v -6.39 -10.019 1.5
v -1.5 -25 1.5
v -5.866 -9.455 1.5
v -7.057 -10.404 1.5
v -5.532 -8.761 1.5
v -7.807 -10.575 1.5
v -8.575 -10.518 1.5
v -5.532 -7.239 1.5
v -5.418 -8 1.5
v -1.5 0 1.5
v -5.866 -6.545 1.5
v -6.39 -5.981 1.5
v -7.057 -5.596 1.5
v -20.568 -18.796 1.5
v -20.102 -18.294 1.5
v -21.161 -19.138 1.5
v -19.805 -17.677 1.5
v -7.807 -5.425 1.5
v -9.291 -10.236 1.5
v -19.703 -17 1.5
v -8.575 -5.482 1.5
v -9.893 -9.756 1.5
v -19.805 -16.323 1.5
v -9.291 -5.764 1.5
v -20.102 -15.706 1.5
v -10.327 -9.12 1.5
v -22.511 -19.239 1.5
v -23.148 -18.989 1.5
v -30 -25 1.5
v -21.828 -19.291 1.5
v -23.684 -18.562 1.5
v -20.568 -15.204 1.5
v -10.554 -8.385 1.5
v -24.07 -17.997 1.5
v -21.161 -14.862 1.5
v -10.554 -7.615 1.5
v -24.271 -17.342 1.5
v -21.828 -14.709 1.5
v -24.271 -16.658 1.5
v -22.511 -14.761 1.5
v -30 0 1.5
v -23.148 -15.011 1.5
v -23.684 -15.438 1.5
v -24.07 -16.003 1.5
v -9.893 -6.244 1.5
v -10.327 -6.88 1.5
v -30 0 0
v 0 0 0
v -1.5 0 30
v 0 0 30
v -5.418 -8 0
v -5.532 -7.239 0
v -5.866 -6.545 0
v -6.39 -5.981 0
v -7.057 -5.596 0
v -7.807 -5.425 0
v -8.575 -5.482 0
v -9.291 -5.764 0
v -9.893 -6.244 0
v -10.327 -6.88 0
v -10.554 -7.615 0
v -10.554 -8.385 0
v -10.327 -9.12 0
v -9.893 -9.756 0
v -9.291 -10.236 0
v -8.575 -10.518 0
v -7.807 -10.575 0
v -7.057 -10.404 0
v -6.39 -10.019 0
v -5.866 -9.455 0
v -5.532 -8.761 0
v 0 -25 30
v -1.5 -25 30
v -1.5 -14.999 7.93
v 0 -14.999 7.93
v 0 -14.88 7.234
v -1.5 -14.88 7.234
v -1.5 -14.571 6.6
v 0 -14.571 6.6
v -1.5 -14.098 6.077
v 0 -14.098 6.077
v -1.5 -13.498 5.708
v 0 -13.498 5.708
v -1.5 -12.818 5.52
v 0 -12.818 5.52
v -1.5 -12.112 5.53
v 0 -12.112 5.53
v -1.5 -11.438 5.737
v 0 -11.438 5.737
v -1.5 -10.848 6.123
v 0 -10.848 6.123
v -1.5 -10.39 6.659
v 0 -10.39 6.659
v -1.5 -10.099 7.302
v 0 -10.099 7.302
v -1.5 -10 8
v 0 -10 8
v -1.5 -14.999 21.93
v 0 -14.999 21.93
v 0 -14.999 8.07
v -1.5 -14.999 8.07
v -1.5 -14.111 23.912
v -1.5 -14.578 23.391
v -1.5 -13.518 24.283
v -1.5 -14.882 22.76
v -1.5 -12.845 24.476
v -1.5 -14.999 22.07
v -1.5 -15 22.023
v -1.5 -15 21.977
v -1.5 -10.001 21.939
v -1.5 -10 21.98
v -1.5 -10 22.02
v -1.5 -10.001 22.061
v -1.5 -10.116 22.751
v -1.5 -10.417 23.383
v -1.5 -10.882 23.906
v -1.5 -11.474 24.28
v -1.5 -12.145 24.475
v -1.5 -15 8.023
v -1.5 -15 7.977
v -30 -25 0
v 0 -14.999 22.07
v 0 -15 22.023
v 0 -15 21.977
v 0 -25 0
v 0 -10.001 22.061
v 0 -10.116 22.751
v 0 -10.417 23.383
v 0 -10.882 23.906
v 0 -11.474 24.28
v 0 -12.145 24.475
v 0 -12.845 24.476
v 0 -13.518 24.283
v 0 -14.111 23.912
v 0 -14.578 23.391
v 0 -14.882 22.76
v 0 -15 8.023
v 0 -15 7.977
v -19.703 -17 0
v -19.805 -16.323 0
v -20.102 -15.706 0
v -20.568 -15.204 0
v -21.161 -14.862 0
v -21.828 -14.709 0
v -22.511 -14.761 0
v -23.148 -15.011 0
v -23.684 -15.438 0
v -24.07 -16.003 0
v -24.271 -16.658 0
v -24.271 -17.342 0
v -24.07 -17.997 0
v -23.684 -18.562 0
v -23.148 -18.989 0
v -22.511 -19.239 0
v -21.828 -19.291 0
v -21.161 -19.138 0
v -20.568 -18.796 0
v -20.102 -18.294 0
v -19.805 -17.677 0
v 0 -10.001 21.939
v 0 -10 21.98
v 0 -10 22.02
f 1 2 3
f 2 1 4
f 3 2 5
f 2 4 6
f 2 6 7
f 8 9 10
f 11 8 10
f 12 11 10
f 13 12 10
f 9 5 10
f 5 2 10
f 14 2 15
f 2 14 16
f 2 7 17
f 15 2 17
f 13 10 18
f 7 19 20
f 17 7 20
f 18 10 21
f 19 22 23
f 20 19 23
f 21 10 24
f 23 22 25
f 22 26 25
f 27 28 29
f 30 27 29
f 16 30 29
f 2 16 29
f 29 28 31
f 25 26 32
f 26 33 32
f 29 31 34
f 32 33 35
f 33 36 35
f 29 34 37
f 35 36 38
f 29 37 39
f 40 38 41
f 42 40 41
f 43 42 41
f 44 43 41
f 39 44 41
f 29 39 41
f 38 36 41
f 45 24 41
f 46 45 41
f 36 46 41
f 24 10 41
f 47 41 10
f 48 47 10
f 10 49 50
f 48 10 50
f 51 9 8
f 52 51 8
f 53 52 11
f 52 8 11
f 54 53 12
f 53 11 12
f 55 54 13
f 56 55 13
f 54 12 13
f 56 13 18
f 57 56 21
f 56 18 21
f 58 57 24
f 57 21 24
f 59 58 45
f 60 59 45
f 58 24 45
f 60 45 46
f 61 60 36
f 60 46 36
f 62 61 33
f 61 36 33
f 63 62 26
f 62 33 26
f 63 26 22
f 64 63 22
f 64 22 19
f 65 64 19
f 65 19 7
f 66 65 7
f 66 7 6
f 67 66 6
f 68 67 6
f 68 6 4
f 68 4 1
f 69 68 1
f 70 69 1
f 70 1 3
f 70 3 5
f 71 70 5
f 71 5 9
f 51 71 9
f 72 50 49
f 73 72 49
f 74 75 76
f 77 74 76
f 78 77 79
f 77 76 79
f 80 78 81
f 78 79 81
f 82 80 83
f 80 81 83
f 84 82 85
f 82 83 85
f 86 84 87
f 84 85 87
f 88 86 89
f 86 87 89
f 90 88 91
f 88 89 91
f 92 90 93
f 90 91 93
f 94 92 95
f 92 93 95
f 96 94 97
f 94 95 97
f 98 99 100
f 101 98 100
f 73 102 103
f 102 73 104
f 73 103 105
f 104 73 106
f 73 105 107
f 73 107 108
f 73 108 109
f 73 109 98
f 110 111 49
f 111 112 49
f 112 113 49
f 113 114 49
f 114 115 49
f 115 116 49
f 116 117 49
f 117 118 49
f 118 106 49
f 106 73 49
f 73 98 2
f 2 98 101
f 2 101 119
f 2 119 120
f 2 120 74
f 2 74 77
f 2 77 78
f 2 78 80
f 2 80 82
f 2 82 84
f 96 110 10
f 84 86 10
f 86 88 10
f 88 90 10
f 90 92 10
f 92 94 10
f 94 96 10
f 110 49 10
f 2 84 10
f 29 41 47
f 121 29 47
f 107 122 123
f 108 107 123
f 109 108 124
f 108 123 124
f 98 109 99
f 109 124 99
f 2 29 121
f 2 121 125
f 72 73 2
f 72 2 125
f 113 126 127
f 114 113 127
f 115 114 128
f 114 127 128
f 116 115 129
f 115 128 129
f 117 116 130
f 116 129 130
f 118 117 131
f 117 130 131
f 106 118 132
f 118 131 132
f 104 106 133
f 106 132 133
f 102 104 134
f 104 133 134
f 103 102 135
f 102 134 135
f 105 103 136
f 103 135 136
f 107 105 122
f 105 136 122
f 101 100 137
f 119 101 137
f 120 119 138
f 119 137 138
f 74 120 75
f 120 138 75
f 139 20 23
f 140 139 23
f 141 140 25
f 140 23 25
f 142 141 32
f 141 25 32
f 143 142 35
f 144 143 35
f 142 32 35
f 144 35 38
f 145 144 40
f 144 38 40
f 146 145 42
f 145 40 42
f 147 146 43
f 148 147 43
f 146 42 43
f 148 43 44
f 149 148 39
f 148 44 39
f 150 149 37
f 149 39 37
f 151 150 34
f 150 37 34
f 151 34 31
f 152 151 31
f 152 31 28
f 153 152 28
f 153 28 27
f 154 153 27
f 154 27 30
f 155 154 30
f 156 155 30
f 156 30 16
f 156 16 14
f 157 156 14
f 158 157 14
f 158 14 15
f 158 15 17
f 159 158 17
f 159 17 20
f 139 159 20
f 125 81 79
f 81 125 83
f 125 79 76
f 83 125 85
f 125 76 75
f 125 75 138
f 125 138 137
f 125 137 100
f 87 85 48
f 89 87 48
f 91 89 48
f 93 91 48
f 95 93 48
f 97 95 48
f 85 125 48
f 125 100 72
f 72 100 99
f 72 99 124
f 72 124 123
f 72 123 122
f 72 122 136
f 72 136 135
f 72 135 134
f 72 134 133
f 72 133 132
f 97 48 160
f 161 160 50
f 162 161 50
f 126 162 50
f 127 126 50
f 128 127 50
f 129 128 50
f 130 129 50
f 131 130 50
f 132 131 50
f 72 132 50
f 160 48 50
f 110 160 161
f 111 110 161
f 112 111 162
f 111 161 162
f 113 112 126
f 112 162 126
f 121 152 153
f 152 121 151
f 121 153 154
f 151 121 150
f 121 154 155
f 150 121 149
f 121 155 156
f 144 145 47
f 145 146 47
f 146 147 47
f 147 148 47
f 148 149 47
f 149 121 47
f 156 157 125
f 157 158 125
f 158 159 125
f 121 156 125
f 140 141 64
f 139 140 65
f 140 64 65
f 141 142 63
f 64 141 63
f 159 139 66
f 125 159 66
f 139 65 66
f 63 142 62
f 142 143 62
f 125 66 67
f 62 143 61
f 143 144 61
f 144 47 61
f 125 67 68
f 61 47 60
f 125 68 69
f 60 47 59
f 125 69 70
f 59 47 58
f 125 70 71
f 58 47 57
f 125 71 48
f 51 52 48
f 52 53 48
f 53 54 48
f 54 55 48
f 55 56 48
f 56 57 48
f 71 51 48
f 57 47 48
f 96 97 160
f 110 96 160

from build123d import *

# Parameters (mm, degrees)
F1_DEPTH = 25
F2_R     = 2.296991
F2_R_2   = 2.582396
F3_DEPTH = 25
F5_DEPTH = 25


with BuildPart() as f1:
    # F0 (on Front) → F1 (new body)
    with BuildSketch(Plane.XZ):
        Polygon((0, 0), (0, 30), (-1.5, 30), (-1.5, 1.5), (-30, 1.5), (-30, 0), align=None)
    extrude(amount=F1_DEPTH)

    # F2 (on face) → F3 (cut)
    with BuildSketch(Plane.XY.offset(1.5)):
        with Locations((-22, -17)):
            Circle(F2_R)
        with Locations((-8, -8)):
            Circle(F2_R_2)
    extrude(amount=-F3_DEPTH, mode=Mode.SUBTRACT)

    # F4 (on face) → F5 (cut)
    with BuildSketch(Plane.YZ):
        with BuildLine():
            Line((-10.000746, 22.061086), (-10.00074, 21.93918))
            ThreePointArc((-10.00074, 21.93918), (-10, 22.000133), (-10.000746, 22.061086))
        make_face()
        with BuildLine():
            Line((-10, 8.000133), (-10.00074, 21.93918))
            Line((-10.00074, 21.93918), (-10.000746, 22.061086))
            ThreePointArc((-10.000746, 22.061086), (-12.495314, 24.499996), (-14.999007, 22.070455))
            Line((-14.999007, 22.070455), (-14.999007, 21.929545))
            Line((-14.999007, 21.929545), (-14.999007, 8.070455))
            Line((-14.999007, 8.070455), (-14.999007, 7.929545))
            ThreePointArc((-14.999007, 7.929545), (-12.464703, 5.500249), (-10, 8.000133))
        make_face()
        with BuildLine():
            Line((-14.999007, 21.929545), (-14.999007, 22.070455))
            ThreePointArc((-14.999007, 22.070455), (-15, 22), (-14.999007, 21.929545))
        make_face()
        with BuildLine():
            ThreePointArc((-14.999007, 8.070455), (-15, 8), (-14.999007, 7.929545))
            Line((-14.999007, 7.929545), (-14.999007, 8.070455))
        make_face()
    extrude(amount=-F5_DEPTH, mode=Mode.SUBTRACT)


solid = f1.part
